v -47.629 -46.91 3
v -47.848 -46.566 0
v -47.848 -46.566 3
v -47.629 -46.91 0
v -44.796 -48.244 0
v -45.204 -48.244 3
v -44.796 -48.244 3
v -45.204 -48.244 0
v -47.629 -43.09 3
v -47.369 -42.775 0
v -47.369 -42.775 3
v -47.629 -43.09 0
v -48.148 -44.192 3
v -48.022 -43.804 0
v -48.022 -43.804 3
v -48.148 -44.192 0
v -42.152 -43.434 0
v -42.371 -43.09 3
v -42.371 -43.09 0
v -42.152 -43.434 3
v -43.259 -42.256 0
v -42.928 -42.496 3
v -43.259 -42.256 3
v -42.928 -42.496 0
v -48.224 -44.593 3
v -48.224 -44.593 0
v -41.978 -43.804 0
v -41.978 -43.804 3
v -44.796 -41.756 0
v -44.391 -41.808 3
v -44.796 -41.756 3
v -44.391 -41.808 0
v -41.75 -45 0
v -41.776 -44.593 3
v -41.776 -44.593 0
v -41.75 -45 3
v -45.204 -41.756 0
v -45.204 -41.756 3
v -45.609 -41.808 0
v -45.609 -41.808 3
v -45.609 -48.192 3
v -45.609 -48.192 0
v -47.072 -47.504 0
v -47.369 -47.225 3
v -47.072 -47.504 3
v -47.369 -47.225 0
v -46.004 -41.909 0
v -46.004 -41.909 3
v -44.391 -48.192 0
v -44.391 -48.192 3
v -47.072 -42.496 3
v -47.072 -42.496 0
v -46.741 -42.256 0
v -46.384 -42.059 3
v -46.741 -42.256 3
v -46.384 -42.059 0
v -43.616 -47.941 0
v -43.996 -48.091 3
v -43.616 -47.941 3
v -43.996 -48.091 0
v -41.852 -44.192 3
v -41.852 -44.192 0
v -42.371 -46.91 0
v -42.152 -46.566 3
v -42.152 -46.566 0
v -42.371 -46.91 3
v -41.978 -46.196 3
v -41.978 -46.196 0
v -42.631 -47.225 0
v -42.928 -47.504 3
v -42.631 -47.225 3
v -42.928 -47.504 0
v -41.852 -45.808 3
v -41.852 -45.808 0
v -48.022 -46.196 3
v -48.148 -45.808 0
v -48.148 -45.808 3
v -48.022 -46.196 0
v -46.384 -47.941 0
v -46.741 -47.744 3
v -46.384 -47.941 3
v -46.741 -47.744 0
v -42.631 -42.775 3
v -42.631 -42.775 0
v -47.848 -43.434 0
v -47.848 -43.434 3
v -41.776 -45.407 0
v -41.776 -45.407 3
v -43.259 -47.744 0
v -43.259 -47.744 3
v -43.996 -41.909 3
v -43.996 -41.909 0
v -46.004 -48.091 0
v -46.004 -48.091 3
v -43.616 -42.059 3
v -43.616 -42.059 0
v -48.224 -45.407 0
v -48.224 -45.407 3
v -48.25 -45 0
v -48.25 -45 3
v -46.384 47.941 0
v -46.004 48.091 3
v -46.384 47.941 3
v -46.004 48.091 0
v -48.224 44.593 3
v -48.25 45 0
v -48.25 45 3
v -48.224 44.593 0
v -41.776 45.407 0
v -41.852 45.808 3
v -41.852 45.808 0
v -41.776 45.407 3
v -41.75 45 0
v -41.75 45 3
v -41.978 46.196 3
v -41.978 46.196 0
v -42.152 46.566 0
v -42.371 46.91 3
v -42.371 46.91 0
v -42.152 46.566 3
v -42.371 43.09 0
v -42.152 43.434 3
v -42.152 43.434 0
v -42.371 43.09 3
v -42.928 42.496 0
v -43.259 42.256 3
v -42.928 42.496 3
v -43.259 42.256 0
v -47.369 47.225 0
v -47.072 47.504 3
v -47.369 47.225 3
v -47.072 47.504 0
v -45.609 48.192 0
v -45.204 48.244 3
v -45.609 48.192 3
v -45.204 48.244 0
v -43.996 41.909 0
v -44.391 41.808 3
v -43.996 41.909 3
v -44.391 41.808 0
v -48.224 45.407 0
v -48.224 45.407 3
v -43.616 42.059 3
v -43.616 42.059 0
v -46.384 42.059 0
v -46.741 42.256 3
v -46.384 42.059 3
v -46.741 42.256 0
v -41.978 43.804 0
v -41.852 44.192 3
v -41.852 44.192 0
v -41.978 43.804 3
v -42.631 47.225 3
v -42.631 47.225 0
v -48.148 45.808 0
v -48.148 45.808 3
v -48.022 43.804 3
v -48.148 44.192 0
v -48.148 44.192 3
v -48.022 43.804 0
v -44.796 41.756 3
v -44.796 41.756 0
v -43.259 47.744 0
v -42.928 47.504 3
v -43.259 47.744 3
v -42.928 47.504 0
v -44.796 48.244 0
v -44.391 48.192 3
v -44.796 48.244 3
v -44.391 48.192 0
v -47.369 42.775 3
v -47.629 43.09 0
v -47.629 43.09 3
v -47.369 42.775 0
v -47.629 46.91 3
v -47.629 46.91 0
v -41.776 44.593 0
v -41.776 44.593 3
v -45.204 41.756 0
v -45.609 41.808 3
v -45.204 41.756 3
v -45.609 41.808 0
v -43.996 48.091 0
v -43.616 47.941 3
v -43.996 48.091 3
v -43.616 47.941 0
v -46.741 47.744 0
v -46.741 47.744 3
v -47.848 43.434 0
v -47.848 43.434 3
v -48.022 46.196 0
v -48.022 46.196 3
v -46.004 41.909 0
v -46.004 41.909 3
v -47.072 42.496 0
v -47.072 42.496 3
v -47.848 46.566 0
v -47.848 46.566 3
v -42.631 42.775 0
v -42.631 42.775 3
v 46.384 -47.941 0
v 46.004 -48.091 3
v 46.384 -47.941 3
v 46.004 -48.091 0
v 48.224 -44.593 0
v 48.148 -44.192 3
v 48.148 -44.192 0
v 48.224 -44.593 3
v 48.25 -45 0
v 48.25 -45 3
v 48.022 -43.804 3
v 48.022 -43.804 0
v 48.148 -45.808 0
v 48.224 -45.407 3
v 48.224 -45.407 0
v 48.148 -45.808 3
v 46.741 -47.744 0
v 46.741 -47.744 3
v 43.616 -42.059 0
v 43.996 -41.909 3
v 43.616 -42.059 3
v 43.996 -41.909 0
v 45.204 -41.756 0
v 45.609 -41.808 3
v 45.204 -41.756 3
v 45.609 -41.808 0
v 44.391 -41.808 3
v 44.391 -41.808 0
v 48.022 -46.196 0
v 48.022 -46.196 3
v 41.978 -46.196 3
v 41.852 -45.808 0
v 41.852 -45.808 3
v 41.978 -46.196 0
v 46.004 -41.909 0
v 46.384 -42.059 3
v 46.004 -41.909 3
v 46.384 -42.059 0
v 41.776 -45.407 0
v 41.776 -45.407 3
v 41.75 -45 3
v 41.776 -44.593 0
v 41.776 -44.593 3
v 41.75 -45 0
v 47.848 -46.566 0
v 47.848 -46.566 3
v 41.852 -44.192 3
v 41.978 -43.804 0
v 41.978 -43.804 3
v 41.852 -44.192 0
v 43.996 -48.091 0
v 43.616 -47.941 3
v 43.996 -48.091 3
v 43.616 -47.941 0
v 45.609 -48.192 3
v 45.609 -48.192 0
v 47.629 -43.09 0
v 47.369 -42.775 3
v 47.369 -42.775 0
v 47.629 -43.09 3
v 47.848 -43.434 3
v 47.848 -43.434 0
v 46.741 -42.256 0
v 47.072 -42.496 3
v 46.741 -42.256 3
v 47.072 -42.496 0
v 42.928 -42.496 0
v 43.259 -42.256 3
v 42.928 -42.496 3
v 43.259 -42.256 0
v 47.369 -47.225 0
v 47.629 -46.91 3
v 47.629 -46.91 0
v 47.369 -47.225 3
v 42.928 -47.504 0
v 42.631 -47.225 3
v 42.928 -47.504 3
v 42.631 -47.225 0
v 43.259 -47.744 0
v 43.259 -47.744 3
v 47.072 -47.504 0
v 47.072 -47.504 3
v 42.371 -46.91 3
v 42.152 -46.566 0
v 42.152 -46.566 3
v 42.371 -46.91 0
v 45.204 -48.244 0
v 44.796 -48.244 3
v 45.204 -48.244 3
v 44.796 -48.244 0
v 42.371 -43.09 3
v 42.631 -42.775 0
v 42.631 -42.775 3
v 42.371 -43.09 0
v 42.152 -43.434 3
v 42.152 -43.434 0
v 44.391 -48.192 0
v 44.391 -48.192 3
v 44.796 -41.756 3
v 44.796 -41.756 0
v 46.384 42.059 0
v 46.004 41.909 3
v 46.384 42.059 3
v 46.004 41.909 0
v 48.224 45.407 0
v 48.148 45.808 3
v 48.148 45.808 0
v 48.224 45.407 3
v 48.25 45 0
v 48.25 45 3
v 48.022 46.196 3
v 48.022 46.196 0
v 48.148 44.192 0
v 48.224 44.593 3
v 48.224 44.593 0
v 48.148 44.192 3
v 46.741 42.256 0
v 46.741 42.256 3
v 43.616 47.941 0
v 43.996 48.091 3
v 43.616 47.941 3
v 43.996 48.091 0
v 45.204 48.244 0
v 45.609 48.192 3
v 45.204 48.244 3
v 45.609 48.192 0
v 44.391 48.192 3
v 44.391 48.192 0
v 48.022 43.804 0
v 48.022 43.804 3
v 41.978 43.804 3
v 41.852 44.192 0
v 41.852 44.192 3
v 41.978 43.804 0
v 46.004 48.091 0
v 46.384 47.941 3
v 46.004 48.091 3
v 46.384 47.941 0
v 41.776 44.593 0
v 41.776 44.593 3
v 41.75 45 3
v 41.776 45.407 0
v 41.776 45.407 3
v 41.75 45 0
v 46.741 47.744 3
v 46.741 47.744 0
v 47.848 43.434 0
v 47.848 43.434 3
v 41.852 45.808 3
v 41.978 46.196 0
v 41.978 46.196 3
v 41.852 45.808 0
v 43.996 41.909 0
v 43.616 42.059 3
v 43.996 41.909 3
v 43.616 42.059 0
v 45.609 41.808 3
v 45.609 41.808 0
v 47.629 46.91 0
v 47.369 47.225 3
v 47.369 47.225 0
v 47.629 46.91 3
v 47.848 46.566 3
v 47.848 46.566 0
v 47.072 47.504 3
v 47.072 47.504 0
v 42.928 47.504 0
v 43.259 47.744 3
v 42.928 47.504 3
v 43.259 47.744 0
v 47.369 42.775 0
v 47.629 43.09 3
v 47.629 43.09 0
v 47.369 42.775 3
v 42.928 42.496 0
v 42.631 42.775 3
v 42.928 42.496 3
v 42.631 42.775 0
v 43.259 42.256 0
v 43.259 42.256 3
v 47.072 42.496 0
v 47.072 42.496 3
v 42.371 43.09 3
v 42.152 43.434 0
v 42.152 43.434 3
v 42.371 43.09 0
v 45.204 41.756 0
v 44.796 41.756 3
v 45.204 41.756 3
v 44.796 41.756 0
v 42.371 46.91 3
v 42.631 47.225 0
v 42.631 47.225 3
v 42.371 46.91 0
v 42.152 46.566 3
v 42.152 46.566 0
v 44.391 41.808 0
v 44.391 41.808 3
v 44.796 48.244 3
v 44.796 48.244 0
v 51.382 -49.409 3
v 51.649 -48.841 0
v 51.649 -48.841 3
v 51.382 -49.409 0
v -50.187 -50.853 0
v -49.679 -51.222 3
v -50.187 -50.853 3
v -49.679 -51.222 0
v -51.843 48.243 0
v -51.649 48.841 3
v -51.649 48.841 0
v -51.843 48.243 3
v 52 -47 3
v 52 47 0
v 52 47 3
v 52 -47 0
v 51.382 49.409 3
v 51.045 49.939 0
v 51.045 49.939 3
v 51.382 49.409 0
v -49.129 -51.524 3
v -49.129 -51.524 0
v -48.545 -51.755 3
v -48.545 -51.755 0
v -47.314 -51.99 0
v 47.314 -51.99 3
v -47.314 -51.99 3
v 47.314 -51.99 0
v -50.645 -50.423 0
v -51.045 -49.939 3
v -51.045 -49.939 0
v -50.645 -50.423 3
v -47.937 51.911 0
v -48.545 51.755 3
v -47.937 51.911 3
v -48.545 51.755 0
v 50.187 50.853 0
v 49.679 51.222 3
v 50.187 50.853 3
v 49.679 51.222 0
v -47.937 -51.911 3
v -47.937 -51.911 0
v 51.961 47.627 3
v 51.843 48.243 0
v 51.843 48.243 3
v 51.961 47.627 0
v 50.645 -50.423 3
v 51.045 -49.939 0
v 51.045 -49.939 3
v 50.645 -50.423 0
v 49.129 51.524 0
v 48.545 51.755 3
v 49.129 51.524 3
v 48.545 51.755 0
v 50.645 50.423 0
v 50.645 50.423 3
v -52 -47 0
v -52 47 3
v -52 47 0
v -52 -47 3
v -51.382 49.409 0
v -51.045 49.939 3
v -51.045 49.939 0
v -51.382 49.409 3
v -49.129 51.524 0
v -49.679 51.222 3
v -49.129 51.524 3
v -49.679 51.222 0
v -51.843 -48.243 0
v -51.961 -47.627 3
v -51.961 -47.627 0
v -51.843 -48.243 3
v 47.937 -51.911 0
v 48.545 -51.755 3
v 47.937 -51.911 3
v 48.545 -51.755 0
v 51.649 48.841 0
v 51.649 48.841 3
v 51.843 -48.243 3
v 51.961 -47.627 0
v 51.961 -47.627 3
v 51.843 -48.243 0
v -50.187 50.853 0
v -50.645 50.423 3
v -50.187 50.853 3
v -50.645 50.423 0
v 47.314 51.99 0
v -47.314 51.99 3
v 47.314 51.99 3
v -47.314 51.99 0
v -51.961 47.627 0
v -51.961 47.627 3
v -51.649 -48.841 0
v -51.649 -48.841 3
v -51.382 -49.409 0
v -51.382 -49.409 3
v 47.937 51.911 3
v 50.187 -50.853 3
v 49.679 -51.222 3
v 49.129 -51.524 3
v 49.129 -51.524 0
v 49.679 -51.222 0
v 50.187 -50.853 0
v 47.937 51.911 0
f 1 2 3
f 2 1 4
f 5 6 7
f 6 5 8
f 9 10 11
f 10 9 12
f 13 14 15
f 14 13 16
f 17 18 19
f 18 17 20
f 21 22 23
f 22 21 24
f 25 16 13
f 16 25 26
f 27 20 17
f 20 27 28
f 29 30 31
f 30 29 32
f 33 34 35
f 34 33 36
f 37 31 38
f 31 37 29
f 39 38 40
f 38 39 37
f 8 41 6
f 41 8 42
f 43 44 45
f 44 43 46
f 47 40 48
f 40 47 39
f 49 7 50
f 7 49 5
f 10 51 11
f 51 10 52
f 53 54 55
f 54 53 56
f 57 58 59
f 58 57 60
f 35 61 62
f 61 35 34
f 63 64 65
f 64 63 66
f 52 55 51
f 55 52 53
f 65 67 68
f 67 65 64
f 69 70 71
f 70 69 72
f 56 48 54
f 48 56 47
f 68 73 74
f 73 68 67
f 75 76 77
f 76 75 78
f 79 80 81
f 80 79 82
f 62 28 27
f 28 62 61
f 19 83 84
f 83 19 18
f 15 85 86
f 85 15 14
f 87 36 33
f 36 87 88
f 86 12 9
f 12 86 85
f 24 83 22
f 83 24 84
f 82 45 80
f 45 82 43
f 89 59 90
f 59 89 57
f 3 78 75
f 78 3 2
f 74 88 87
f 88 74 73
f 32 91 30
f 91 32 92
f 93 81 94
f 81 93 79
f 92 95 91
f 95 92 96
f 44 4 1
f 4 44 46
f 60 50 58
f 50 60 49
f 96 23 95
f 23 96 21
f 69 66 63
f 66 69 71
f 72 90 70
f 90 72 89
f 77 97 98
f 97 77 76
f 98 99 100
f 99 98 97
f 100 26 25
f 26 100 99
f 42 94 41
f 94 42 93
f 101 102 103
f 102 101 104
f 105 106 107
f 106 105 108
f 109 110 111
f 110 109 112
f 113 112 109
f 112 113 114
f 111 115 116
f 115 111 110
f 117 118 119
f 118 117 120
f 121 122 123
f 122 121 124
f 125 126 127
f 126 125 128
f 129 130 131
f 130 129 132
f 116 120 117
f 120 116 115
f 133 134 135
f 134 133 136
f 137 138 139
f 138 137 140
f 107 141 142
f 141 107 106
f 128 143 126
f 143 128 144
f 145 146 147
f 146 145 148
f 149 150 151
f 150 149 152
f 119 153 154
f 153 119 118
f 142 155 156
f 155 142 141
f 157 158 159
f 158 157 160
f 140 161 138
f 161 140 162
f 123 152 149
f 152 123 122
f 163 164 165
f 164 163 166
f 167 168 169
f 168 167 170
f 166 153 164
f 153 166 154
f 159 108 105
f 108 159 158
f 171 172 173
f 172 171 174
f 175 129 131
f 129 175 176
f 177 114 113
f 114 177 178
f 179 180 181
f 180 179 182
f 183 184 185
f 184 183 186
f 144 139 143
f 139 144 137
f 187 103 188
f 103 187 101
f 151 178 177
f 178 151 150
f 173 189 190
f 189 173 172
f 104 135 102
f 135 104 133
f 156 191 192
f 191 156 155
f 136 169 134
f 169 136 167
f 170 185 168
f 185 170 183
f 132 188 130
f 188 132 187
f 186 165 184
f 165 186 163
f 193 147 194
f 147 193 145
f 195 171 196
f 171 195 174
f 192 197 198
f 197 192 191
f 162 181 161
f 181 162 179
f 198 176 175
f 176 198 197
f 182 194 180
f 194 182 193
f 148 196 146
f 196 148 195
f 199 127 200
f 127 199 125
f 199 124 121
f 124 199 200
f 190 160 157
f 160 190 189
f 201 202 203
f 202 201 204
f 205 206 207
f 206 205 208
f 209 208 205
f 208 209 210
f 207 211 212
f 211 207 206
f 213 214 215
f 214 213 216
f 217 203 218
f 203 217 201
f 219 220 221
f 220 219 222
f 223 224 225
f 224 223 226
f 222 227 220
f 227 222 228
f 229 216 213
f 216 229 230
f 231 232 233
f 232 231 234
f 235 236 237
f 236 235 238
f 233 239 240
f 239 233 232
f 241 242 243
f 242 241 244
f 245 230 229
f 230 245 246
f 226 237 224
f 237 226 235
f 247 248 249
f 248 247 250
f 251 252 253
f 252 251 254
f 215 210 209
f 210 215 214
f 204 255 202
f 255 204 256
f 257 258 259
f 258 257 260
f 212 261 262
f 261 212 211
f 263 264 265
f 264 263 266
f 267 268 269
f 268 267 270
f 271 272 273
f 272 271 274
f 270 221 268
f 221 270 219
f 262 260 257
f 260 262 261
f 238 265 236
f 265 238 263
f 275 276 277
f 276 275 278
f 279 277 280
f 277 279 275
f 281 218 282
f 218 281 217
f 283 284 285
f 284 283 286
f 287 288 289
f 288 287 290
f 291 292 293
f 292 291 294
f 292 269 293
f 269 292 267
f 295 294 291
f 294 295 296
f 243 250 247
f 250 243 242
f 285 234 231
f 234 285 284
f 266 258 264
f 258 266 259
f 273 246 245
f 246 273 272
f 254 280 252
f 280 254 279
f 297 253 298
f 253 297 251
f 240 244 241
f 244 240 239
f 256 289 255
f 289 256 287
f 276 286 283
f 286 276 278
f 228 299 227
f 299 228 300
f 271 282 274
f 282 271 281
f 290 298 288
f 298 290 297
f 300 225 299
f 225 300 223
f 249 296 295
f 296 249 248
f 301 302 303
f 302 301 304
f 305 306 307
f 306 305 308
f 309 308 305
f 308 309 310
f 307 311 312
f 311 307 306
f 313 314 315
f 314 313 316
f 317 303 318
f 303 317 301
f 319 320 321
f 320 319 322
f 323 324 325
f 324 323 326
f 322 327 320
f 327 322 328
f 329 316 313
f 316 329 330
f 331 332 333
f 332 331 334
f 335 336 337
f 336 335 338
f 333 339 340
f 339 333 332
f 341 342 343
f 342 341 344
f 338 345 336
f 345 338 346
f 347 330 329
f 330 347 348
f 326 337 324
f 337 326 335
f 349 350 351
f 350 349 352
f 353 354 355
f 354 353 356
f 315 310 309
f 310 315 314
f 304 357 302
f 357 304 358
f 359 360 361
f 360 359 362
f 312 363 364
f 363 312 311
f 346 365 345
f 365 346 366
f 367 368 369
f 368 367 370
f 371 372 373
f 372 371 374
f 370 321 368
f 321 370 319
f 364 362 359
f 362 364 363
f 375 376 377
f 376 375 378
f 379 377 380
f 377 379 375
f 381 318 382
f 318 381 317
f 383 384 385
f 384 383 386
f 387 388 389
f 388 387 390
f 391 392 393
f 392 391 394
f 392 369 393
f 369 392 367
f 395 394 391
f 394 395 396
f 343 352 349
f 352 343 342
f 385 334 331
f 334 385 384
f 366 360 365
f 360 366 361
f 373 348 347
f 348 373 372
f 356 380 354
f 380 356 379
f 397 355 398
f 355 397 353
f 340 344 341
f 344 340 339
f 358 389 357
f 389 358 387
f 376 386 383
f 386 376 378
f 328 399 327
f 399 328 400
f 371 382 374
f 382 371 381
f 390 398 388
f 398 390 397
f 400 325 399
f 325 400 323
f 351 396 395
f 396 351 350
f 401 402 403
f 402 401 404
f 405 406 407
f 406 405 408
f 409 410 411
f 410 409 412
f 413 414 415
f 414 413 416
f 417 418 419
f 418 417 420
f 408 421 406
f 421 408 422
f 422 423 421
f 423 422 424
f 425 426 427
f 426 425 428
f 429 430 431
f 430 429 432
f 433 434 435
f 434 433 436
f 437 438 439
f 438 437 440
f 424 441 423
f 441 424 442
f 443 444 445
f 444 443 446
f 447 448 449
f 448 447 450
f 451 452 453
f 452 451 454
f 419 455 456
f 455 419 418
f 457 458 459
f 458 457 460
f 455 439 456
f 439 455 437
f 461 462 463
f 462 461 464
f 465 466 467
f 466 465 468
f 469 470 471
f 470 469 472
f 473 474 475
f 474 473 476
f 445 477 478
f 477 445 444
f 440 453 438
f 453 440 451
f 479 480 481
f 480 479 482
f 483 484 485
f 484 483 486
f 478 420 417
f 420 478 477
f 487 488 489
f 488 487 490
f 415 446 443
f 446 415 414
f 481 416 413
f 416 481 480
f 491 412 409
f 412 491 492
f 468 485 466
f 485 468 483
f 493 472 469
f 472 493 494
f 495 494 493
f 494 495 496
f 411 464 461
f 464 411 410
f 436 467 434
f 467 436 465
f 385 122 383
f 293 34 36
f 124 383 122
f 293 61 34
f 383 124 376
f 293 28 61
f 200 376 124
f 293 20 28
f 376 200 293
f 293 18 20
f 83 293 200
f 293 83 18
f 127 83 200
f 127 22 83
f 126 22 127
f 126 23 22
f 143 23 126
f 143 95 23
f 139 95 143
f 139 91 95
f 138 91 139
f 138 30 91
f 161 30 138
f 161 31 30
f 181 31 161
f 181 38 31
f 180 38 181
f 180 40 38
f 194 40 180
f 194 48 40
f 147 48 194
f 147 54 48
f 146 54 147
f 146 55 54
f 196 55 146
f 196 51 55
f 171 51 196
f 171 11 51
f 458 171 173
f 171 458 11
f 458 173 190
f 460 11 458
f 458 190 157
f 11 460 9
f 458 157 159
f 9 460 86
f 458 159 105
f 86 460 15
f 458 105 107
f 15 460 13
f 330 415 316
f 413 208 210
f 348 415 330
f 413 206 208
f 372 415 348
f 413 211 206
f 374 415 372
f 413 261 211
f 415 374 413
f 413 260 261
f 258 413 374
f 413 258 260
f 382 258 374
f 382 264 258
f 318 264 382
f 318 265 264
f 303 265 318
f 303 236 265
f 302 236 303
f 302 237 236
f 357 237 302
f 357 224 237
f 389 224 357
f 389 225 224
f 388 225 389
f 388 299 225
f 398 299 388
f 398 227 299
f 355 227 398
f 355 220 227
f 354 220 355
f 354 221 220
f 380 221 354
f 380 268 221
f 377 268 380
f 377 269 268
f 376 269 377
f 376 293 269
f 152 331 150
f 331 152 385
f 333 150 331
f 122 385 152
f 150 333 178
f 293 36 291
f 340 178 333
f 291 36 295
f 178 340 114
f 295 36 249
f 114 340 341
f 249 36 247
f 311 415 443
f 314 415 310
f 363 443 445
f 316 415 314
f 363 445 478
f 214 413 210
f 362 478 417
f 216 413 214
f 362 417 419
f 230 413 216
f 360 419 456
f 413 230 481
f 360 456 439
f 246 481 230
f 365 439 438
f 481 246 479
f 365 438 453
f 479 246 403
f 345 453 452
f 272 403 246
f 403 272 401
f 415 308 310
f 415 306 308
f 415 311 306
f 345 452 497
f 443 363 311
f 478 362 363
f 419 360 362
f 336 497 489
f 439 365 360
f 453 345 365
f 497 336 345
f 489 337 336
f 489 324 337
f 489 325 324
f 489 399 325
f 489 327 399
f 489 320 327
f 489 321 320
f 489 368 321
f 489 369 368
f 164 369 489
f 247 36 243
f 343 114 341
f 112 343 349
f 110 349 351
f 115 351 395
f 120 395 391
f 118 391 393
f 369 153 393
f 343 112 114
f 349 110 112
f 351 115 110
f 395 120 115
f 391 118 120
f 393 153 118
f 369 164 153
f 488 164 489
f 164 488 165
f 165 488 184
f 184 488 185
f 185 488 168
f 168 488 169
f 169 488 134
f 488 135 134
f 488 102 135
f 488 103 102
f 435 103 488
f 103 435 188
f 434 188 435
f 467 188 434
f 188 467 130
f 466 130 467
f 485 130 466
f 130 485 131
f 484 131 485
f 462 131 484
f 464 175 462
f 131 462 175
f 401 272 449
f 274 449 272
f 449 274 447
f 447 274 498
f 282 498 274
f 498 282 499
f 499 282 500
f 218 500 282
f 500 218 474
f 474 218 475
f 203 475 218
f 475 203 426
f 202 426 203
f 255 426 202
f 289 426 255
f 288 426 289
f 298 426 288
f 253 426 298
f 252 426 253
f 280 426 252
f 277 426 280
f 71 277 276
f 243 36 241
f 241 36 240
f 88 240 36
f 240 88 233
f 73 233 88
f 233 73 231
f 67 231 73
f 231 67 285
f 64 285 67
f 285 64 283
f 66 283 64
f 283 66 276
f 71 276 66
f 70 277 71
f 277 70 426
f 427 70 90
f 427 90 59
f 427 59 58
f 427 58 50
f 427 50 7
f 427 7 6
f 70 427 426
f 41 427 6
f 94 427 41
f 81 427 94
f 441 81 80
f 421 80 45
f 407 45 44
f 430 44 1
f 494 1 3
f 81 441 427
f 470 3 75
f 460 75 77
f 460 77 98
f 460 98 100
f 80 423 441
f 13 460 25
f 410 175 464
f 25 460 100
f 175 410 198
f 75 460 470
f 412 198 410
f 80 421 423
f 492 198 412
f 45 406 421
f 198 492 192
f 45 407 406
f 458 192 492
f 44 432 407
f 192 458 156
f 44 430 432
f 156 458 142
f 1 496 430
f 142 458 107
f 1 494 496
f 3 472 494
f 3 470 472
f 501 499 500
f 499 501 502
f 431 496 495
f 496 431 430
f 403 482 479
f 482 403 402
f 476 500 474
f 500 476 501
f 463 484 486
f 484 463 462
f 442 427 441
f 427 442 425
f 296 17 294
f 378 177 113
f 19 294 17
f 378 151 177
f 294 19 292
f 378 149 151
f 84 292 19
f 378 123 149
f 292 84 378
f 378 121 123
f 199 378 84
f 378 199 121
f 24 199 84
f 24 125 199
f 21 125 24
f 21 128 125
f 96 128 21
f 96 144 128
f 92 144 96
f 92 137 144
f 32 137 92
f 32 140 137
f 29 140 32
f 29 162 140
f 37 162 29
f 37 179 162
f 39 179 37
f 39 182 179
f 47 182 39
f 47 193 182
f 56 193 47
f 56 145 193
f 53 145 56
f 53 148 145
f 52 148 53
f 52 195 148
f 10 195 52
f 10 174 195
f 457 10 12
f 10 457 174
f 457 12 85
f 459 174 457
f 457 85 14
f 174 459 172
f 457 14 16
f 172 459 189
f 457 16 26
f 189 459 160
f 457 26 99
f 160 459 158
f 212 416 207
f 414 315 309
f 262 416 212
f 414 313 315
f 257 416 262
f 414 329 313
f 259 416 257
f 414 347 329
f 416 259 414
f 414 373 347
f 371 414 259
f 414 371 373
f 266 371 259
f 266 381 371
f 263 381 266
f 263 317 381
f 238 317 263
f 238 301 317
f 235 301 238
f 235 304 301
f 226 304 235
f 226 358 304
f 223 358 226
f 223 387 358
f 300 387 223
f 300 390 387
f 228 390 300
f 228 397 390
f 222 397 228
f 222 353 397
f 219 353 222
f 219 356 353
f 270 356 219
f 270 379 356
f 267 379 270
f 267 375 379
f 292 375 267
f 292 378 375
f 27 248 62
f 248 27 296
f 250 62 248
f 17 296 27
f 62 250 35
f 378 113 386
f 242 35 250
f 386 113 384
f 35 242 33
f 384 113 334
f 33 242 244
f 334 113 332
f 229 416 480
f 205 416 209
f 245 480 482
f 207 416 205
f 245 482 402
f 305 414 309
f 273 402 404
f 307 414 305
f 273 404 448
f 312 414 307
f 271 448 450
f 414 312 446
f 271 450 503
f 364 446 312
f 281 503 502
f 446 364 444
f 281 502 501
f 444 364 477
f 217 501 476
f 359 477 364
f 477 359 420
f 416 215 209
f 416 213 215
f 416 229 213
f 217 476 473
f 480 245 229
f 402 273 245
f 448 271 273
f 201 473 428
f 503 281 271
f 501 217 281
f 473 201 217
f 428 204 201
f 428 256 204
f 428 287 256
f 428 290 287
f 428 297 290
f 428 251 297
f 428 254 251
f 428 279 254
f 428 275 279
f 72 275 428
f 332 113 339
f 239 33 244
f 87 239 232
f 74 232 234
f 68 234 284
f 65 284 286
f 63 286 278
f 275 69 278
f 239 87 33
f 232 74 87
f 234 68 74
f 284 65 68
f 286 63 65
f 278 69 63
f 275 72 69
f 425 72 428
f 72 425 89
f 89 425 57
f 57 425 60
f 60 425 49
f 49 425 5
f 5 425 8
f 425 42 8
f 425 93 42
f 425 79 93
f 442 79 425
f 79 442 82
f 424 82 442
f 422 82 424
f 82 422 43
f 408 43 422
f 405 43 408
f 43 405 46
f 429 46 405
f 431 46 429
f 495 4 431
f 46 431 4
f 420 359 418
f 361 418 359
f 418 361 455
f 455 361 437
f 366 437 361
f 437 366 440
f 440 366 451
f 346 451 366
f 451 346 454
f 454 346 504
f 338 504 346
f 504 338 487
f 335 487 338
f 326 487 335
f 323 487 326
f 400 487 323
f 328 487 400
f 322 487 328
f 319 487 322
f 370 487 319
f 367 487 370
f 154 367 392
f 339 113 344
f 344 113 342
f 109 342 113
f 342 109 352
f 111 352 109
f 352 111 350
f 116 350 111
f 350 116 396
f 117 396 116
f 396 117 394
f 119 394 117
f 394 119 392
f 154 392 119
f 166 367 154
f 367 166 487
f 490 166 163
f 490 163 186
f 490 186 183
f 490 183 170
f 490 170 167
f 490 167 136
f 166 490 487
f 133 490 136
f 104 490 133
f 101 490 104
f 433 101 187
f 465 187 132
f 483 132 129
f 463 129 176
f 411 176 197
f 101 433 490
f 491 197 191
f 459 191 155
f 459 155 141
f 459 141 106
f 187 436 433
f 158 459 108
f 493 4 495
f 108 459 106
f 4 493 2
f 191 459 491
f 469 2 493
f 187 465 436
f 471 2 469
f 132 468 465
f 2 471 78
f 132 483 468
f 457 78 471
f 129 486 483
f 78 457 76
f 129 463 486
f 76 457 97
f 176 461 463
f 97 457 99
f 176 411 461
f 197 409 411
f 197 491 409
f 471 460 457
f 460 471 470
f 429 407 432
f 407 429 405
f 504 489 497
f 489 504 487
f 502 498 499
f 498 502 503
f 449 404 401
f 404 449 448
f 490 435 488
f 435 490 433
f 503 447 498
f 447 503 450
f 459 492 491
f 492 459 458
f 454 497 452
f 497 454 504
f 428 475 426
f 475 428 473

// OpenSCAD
$fn = 50;


difference() {
	union() {
		hull() {
			translate(v = [-47.0000000000, 47.0000000000, 0]) {
				cylinder(h = 3, r = 5);
			}
			translate(v = [47.0000000000, 47.0000000000, 0]) {
				cylinder(h = 3, r = 5);
			}
			translate(v = [-47.0000000000, -47.0000000000, 0]) {
				cylinder(h = 3, r = 5);
			}
			translate(v = [47.0000000000, -47.0000000000, 0]) {
				cylinder(h = 3, r = 5);
			}
		}
	}
	union() {
		translate(v = [-45.0000000000, -45.0000000000, -100.0000000000]) {
			cylinder(h = 200, r = 3.2500000000);
		}
		translate(v = [-45.0000000000, 45.0000000000, -100.0000000000]) {
			cylinder(h = 200, r = 3.2500000000);
		}
		translate(v = [45.0000000000, -45.0000000000, -100.0000000000]) {
			cylinder(h = 200, r = 3.2500000000);
		}
		translate(v = [45.0000000000, 45.0000000000, -100.0000000000]) {
			cylinder(h = 200, r = 3.2500000000);
		}
	}
}
